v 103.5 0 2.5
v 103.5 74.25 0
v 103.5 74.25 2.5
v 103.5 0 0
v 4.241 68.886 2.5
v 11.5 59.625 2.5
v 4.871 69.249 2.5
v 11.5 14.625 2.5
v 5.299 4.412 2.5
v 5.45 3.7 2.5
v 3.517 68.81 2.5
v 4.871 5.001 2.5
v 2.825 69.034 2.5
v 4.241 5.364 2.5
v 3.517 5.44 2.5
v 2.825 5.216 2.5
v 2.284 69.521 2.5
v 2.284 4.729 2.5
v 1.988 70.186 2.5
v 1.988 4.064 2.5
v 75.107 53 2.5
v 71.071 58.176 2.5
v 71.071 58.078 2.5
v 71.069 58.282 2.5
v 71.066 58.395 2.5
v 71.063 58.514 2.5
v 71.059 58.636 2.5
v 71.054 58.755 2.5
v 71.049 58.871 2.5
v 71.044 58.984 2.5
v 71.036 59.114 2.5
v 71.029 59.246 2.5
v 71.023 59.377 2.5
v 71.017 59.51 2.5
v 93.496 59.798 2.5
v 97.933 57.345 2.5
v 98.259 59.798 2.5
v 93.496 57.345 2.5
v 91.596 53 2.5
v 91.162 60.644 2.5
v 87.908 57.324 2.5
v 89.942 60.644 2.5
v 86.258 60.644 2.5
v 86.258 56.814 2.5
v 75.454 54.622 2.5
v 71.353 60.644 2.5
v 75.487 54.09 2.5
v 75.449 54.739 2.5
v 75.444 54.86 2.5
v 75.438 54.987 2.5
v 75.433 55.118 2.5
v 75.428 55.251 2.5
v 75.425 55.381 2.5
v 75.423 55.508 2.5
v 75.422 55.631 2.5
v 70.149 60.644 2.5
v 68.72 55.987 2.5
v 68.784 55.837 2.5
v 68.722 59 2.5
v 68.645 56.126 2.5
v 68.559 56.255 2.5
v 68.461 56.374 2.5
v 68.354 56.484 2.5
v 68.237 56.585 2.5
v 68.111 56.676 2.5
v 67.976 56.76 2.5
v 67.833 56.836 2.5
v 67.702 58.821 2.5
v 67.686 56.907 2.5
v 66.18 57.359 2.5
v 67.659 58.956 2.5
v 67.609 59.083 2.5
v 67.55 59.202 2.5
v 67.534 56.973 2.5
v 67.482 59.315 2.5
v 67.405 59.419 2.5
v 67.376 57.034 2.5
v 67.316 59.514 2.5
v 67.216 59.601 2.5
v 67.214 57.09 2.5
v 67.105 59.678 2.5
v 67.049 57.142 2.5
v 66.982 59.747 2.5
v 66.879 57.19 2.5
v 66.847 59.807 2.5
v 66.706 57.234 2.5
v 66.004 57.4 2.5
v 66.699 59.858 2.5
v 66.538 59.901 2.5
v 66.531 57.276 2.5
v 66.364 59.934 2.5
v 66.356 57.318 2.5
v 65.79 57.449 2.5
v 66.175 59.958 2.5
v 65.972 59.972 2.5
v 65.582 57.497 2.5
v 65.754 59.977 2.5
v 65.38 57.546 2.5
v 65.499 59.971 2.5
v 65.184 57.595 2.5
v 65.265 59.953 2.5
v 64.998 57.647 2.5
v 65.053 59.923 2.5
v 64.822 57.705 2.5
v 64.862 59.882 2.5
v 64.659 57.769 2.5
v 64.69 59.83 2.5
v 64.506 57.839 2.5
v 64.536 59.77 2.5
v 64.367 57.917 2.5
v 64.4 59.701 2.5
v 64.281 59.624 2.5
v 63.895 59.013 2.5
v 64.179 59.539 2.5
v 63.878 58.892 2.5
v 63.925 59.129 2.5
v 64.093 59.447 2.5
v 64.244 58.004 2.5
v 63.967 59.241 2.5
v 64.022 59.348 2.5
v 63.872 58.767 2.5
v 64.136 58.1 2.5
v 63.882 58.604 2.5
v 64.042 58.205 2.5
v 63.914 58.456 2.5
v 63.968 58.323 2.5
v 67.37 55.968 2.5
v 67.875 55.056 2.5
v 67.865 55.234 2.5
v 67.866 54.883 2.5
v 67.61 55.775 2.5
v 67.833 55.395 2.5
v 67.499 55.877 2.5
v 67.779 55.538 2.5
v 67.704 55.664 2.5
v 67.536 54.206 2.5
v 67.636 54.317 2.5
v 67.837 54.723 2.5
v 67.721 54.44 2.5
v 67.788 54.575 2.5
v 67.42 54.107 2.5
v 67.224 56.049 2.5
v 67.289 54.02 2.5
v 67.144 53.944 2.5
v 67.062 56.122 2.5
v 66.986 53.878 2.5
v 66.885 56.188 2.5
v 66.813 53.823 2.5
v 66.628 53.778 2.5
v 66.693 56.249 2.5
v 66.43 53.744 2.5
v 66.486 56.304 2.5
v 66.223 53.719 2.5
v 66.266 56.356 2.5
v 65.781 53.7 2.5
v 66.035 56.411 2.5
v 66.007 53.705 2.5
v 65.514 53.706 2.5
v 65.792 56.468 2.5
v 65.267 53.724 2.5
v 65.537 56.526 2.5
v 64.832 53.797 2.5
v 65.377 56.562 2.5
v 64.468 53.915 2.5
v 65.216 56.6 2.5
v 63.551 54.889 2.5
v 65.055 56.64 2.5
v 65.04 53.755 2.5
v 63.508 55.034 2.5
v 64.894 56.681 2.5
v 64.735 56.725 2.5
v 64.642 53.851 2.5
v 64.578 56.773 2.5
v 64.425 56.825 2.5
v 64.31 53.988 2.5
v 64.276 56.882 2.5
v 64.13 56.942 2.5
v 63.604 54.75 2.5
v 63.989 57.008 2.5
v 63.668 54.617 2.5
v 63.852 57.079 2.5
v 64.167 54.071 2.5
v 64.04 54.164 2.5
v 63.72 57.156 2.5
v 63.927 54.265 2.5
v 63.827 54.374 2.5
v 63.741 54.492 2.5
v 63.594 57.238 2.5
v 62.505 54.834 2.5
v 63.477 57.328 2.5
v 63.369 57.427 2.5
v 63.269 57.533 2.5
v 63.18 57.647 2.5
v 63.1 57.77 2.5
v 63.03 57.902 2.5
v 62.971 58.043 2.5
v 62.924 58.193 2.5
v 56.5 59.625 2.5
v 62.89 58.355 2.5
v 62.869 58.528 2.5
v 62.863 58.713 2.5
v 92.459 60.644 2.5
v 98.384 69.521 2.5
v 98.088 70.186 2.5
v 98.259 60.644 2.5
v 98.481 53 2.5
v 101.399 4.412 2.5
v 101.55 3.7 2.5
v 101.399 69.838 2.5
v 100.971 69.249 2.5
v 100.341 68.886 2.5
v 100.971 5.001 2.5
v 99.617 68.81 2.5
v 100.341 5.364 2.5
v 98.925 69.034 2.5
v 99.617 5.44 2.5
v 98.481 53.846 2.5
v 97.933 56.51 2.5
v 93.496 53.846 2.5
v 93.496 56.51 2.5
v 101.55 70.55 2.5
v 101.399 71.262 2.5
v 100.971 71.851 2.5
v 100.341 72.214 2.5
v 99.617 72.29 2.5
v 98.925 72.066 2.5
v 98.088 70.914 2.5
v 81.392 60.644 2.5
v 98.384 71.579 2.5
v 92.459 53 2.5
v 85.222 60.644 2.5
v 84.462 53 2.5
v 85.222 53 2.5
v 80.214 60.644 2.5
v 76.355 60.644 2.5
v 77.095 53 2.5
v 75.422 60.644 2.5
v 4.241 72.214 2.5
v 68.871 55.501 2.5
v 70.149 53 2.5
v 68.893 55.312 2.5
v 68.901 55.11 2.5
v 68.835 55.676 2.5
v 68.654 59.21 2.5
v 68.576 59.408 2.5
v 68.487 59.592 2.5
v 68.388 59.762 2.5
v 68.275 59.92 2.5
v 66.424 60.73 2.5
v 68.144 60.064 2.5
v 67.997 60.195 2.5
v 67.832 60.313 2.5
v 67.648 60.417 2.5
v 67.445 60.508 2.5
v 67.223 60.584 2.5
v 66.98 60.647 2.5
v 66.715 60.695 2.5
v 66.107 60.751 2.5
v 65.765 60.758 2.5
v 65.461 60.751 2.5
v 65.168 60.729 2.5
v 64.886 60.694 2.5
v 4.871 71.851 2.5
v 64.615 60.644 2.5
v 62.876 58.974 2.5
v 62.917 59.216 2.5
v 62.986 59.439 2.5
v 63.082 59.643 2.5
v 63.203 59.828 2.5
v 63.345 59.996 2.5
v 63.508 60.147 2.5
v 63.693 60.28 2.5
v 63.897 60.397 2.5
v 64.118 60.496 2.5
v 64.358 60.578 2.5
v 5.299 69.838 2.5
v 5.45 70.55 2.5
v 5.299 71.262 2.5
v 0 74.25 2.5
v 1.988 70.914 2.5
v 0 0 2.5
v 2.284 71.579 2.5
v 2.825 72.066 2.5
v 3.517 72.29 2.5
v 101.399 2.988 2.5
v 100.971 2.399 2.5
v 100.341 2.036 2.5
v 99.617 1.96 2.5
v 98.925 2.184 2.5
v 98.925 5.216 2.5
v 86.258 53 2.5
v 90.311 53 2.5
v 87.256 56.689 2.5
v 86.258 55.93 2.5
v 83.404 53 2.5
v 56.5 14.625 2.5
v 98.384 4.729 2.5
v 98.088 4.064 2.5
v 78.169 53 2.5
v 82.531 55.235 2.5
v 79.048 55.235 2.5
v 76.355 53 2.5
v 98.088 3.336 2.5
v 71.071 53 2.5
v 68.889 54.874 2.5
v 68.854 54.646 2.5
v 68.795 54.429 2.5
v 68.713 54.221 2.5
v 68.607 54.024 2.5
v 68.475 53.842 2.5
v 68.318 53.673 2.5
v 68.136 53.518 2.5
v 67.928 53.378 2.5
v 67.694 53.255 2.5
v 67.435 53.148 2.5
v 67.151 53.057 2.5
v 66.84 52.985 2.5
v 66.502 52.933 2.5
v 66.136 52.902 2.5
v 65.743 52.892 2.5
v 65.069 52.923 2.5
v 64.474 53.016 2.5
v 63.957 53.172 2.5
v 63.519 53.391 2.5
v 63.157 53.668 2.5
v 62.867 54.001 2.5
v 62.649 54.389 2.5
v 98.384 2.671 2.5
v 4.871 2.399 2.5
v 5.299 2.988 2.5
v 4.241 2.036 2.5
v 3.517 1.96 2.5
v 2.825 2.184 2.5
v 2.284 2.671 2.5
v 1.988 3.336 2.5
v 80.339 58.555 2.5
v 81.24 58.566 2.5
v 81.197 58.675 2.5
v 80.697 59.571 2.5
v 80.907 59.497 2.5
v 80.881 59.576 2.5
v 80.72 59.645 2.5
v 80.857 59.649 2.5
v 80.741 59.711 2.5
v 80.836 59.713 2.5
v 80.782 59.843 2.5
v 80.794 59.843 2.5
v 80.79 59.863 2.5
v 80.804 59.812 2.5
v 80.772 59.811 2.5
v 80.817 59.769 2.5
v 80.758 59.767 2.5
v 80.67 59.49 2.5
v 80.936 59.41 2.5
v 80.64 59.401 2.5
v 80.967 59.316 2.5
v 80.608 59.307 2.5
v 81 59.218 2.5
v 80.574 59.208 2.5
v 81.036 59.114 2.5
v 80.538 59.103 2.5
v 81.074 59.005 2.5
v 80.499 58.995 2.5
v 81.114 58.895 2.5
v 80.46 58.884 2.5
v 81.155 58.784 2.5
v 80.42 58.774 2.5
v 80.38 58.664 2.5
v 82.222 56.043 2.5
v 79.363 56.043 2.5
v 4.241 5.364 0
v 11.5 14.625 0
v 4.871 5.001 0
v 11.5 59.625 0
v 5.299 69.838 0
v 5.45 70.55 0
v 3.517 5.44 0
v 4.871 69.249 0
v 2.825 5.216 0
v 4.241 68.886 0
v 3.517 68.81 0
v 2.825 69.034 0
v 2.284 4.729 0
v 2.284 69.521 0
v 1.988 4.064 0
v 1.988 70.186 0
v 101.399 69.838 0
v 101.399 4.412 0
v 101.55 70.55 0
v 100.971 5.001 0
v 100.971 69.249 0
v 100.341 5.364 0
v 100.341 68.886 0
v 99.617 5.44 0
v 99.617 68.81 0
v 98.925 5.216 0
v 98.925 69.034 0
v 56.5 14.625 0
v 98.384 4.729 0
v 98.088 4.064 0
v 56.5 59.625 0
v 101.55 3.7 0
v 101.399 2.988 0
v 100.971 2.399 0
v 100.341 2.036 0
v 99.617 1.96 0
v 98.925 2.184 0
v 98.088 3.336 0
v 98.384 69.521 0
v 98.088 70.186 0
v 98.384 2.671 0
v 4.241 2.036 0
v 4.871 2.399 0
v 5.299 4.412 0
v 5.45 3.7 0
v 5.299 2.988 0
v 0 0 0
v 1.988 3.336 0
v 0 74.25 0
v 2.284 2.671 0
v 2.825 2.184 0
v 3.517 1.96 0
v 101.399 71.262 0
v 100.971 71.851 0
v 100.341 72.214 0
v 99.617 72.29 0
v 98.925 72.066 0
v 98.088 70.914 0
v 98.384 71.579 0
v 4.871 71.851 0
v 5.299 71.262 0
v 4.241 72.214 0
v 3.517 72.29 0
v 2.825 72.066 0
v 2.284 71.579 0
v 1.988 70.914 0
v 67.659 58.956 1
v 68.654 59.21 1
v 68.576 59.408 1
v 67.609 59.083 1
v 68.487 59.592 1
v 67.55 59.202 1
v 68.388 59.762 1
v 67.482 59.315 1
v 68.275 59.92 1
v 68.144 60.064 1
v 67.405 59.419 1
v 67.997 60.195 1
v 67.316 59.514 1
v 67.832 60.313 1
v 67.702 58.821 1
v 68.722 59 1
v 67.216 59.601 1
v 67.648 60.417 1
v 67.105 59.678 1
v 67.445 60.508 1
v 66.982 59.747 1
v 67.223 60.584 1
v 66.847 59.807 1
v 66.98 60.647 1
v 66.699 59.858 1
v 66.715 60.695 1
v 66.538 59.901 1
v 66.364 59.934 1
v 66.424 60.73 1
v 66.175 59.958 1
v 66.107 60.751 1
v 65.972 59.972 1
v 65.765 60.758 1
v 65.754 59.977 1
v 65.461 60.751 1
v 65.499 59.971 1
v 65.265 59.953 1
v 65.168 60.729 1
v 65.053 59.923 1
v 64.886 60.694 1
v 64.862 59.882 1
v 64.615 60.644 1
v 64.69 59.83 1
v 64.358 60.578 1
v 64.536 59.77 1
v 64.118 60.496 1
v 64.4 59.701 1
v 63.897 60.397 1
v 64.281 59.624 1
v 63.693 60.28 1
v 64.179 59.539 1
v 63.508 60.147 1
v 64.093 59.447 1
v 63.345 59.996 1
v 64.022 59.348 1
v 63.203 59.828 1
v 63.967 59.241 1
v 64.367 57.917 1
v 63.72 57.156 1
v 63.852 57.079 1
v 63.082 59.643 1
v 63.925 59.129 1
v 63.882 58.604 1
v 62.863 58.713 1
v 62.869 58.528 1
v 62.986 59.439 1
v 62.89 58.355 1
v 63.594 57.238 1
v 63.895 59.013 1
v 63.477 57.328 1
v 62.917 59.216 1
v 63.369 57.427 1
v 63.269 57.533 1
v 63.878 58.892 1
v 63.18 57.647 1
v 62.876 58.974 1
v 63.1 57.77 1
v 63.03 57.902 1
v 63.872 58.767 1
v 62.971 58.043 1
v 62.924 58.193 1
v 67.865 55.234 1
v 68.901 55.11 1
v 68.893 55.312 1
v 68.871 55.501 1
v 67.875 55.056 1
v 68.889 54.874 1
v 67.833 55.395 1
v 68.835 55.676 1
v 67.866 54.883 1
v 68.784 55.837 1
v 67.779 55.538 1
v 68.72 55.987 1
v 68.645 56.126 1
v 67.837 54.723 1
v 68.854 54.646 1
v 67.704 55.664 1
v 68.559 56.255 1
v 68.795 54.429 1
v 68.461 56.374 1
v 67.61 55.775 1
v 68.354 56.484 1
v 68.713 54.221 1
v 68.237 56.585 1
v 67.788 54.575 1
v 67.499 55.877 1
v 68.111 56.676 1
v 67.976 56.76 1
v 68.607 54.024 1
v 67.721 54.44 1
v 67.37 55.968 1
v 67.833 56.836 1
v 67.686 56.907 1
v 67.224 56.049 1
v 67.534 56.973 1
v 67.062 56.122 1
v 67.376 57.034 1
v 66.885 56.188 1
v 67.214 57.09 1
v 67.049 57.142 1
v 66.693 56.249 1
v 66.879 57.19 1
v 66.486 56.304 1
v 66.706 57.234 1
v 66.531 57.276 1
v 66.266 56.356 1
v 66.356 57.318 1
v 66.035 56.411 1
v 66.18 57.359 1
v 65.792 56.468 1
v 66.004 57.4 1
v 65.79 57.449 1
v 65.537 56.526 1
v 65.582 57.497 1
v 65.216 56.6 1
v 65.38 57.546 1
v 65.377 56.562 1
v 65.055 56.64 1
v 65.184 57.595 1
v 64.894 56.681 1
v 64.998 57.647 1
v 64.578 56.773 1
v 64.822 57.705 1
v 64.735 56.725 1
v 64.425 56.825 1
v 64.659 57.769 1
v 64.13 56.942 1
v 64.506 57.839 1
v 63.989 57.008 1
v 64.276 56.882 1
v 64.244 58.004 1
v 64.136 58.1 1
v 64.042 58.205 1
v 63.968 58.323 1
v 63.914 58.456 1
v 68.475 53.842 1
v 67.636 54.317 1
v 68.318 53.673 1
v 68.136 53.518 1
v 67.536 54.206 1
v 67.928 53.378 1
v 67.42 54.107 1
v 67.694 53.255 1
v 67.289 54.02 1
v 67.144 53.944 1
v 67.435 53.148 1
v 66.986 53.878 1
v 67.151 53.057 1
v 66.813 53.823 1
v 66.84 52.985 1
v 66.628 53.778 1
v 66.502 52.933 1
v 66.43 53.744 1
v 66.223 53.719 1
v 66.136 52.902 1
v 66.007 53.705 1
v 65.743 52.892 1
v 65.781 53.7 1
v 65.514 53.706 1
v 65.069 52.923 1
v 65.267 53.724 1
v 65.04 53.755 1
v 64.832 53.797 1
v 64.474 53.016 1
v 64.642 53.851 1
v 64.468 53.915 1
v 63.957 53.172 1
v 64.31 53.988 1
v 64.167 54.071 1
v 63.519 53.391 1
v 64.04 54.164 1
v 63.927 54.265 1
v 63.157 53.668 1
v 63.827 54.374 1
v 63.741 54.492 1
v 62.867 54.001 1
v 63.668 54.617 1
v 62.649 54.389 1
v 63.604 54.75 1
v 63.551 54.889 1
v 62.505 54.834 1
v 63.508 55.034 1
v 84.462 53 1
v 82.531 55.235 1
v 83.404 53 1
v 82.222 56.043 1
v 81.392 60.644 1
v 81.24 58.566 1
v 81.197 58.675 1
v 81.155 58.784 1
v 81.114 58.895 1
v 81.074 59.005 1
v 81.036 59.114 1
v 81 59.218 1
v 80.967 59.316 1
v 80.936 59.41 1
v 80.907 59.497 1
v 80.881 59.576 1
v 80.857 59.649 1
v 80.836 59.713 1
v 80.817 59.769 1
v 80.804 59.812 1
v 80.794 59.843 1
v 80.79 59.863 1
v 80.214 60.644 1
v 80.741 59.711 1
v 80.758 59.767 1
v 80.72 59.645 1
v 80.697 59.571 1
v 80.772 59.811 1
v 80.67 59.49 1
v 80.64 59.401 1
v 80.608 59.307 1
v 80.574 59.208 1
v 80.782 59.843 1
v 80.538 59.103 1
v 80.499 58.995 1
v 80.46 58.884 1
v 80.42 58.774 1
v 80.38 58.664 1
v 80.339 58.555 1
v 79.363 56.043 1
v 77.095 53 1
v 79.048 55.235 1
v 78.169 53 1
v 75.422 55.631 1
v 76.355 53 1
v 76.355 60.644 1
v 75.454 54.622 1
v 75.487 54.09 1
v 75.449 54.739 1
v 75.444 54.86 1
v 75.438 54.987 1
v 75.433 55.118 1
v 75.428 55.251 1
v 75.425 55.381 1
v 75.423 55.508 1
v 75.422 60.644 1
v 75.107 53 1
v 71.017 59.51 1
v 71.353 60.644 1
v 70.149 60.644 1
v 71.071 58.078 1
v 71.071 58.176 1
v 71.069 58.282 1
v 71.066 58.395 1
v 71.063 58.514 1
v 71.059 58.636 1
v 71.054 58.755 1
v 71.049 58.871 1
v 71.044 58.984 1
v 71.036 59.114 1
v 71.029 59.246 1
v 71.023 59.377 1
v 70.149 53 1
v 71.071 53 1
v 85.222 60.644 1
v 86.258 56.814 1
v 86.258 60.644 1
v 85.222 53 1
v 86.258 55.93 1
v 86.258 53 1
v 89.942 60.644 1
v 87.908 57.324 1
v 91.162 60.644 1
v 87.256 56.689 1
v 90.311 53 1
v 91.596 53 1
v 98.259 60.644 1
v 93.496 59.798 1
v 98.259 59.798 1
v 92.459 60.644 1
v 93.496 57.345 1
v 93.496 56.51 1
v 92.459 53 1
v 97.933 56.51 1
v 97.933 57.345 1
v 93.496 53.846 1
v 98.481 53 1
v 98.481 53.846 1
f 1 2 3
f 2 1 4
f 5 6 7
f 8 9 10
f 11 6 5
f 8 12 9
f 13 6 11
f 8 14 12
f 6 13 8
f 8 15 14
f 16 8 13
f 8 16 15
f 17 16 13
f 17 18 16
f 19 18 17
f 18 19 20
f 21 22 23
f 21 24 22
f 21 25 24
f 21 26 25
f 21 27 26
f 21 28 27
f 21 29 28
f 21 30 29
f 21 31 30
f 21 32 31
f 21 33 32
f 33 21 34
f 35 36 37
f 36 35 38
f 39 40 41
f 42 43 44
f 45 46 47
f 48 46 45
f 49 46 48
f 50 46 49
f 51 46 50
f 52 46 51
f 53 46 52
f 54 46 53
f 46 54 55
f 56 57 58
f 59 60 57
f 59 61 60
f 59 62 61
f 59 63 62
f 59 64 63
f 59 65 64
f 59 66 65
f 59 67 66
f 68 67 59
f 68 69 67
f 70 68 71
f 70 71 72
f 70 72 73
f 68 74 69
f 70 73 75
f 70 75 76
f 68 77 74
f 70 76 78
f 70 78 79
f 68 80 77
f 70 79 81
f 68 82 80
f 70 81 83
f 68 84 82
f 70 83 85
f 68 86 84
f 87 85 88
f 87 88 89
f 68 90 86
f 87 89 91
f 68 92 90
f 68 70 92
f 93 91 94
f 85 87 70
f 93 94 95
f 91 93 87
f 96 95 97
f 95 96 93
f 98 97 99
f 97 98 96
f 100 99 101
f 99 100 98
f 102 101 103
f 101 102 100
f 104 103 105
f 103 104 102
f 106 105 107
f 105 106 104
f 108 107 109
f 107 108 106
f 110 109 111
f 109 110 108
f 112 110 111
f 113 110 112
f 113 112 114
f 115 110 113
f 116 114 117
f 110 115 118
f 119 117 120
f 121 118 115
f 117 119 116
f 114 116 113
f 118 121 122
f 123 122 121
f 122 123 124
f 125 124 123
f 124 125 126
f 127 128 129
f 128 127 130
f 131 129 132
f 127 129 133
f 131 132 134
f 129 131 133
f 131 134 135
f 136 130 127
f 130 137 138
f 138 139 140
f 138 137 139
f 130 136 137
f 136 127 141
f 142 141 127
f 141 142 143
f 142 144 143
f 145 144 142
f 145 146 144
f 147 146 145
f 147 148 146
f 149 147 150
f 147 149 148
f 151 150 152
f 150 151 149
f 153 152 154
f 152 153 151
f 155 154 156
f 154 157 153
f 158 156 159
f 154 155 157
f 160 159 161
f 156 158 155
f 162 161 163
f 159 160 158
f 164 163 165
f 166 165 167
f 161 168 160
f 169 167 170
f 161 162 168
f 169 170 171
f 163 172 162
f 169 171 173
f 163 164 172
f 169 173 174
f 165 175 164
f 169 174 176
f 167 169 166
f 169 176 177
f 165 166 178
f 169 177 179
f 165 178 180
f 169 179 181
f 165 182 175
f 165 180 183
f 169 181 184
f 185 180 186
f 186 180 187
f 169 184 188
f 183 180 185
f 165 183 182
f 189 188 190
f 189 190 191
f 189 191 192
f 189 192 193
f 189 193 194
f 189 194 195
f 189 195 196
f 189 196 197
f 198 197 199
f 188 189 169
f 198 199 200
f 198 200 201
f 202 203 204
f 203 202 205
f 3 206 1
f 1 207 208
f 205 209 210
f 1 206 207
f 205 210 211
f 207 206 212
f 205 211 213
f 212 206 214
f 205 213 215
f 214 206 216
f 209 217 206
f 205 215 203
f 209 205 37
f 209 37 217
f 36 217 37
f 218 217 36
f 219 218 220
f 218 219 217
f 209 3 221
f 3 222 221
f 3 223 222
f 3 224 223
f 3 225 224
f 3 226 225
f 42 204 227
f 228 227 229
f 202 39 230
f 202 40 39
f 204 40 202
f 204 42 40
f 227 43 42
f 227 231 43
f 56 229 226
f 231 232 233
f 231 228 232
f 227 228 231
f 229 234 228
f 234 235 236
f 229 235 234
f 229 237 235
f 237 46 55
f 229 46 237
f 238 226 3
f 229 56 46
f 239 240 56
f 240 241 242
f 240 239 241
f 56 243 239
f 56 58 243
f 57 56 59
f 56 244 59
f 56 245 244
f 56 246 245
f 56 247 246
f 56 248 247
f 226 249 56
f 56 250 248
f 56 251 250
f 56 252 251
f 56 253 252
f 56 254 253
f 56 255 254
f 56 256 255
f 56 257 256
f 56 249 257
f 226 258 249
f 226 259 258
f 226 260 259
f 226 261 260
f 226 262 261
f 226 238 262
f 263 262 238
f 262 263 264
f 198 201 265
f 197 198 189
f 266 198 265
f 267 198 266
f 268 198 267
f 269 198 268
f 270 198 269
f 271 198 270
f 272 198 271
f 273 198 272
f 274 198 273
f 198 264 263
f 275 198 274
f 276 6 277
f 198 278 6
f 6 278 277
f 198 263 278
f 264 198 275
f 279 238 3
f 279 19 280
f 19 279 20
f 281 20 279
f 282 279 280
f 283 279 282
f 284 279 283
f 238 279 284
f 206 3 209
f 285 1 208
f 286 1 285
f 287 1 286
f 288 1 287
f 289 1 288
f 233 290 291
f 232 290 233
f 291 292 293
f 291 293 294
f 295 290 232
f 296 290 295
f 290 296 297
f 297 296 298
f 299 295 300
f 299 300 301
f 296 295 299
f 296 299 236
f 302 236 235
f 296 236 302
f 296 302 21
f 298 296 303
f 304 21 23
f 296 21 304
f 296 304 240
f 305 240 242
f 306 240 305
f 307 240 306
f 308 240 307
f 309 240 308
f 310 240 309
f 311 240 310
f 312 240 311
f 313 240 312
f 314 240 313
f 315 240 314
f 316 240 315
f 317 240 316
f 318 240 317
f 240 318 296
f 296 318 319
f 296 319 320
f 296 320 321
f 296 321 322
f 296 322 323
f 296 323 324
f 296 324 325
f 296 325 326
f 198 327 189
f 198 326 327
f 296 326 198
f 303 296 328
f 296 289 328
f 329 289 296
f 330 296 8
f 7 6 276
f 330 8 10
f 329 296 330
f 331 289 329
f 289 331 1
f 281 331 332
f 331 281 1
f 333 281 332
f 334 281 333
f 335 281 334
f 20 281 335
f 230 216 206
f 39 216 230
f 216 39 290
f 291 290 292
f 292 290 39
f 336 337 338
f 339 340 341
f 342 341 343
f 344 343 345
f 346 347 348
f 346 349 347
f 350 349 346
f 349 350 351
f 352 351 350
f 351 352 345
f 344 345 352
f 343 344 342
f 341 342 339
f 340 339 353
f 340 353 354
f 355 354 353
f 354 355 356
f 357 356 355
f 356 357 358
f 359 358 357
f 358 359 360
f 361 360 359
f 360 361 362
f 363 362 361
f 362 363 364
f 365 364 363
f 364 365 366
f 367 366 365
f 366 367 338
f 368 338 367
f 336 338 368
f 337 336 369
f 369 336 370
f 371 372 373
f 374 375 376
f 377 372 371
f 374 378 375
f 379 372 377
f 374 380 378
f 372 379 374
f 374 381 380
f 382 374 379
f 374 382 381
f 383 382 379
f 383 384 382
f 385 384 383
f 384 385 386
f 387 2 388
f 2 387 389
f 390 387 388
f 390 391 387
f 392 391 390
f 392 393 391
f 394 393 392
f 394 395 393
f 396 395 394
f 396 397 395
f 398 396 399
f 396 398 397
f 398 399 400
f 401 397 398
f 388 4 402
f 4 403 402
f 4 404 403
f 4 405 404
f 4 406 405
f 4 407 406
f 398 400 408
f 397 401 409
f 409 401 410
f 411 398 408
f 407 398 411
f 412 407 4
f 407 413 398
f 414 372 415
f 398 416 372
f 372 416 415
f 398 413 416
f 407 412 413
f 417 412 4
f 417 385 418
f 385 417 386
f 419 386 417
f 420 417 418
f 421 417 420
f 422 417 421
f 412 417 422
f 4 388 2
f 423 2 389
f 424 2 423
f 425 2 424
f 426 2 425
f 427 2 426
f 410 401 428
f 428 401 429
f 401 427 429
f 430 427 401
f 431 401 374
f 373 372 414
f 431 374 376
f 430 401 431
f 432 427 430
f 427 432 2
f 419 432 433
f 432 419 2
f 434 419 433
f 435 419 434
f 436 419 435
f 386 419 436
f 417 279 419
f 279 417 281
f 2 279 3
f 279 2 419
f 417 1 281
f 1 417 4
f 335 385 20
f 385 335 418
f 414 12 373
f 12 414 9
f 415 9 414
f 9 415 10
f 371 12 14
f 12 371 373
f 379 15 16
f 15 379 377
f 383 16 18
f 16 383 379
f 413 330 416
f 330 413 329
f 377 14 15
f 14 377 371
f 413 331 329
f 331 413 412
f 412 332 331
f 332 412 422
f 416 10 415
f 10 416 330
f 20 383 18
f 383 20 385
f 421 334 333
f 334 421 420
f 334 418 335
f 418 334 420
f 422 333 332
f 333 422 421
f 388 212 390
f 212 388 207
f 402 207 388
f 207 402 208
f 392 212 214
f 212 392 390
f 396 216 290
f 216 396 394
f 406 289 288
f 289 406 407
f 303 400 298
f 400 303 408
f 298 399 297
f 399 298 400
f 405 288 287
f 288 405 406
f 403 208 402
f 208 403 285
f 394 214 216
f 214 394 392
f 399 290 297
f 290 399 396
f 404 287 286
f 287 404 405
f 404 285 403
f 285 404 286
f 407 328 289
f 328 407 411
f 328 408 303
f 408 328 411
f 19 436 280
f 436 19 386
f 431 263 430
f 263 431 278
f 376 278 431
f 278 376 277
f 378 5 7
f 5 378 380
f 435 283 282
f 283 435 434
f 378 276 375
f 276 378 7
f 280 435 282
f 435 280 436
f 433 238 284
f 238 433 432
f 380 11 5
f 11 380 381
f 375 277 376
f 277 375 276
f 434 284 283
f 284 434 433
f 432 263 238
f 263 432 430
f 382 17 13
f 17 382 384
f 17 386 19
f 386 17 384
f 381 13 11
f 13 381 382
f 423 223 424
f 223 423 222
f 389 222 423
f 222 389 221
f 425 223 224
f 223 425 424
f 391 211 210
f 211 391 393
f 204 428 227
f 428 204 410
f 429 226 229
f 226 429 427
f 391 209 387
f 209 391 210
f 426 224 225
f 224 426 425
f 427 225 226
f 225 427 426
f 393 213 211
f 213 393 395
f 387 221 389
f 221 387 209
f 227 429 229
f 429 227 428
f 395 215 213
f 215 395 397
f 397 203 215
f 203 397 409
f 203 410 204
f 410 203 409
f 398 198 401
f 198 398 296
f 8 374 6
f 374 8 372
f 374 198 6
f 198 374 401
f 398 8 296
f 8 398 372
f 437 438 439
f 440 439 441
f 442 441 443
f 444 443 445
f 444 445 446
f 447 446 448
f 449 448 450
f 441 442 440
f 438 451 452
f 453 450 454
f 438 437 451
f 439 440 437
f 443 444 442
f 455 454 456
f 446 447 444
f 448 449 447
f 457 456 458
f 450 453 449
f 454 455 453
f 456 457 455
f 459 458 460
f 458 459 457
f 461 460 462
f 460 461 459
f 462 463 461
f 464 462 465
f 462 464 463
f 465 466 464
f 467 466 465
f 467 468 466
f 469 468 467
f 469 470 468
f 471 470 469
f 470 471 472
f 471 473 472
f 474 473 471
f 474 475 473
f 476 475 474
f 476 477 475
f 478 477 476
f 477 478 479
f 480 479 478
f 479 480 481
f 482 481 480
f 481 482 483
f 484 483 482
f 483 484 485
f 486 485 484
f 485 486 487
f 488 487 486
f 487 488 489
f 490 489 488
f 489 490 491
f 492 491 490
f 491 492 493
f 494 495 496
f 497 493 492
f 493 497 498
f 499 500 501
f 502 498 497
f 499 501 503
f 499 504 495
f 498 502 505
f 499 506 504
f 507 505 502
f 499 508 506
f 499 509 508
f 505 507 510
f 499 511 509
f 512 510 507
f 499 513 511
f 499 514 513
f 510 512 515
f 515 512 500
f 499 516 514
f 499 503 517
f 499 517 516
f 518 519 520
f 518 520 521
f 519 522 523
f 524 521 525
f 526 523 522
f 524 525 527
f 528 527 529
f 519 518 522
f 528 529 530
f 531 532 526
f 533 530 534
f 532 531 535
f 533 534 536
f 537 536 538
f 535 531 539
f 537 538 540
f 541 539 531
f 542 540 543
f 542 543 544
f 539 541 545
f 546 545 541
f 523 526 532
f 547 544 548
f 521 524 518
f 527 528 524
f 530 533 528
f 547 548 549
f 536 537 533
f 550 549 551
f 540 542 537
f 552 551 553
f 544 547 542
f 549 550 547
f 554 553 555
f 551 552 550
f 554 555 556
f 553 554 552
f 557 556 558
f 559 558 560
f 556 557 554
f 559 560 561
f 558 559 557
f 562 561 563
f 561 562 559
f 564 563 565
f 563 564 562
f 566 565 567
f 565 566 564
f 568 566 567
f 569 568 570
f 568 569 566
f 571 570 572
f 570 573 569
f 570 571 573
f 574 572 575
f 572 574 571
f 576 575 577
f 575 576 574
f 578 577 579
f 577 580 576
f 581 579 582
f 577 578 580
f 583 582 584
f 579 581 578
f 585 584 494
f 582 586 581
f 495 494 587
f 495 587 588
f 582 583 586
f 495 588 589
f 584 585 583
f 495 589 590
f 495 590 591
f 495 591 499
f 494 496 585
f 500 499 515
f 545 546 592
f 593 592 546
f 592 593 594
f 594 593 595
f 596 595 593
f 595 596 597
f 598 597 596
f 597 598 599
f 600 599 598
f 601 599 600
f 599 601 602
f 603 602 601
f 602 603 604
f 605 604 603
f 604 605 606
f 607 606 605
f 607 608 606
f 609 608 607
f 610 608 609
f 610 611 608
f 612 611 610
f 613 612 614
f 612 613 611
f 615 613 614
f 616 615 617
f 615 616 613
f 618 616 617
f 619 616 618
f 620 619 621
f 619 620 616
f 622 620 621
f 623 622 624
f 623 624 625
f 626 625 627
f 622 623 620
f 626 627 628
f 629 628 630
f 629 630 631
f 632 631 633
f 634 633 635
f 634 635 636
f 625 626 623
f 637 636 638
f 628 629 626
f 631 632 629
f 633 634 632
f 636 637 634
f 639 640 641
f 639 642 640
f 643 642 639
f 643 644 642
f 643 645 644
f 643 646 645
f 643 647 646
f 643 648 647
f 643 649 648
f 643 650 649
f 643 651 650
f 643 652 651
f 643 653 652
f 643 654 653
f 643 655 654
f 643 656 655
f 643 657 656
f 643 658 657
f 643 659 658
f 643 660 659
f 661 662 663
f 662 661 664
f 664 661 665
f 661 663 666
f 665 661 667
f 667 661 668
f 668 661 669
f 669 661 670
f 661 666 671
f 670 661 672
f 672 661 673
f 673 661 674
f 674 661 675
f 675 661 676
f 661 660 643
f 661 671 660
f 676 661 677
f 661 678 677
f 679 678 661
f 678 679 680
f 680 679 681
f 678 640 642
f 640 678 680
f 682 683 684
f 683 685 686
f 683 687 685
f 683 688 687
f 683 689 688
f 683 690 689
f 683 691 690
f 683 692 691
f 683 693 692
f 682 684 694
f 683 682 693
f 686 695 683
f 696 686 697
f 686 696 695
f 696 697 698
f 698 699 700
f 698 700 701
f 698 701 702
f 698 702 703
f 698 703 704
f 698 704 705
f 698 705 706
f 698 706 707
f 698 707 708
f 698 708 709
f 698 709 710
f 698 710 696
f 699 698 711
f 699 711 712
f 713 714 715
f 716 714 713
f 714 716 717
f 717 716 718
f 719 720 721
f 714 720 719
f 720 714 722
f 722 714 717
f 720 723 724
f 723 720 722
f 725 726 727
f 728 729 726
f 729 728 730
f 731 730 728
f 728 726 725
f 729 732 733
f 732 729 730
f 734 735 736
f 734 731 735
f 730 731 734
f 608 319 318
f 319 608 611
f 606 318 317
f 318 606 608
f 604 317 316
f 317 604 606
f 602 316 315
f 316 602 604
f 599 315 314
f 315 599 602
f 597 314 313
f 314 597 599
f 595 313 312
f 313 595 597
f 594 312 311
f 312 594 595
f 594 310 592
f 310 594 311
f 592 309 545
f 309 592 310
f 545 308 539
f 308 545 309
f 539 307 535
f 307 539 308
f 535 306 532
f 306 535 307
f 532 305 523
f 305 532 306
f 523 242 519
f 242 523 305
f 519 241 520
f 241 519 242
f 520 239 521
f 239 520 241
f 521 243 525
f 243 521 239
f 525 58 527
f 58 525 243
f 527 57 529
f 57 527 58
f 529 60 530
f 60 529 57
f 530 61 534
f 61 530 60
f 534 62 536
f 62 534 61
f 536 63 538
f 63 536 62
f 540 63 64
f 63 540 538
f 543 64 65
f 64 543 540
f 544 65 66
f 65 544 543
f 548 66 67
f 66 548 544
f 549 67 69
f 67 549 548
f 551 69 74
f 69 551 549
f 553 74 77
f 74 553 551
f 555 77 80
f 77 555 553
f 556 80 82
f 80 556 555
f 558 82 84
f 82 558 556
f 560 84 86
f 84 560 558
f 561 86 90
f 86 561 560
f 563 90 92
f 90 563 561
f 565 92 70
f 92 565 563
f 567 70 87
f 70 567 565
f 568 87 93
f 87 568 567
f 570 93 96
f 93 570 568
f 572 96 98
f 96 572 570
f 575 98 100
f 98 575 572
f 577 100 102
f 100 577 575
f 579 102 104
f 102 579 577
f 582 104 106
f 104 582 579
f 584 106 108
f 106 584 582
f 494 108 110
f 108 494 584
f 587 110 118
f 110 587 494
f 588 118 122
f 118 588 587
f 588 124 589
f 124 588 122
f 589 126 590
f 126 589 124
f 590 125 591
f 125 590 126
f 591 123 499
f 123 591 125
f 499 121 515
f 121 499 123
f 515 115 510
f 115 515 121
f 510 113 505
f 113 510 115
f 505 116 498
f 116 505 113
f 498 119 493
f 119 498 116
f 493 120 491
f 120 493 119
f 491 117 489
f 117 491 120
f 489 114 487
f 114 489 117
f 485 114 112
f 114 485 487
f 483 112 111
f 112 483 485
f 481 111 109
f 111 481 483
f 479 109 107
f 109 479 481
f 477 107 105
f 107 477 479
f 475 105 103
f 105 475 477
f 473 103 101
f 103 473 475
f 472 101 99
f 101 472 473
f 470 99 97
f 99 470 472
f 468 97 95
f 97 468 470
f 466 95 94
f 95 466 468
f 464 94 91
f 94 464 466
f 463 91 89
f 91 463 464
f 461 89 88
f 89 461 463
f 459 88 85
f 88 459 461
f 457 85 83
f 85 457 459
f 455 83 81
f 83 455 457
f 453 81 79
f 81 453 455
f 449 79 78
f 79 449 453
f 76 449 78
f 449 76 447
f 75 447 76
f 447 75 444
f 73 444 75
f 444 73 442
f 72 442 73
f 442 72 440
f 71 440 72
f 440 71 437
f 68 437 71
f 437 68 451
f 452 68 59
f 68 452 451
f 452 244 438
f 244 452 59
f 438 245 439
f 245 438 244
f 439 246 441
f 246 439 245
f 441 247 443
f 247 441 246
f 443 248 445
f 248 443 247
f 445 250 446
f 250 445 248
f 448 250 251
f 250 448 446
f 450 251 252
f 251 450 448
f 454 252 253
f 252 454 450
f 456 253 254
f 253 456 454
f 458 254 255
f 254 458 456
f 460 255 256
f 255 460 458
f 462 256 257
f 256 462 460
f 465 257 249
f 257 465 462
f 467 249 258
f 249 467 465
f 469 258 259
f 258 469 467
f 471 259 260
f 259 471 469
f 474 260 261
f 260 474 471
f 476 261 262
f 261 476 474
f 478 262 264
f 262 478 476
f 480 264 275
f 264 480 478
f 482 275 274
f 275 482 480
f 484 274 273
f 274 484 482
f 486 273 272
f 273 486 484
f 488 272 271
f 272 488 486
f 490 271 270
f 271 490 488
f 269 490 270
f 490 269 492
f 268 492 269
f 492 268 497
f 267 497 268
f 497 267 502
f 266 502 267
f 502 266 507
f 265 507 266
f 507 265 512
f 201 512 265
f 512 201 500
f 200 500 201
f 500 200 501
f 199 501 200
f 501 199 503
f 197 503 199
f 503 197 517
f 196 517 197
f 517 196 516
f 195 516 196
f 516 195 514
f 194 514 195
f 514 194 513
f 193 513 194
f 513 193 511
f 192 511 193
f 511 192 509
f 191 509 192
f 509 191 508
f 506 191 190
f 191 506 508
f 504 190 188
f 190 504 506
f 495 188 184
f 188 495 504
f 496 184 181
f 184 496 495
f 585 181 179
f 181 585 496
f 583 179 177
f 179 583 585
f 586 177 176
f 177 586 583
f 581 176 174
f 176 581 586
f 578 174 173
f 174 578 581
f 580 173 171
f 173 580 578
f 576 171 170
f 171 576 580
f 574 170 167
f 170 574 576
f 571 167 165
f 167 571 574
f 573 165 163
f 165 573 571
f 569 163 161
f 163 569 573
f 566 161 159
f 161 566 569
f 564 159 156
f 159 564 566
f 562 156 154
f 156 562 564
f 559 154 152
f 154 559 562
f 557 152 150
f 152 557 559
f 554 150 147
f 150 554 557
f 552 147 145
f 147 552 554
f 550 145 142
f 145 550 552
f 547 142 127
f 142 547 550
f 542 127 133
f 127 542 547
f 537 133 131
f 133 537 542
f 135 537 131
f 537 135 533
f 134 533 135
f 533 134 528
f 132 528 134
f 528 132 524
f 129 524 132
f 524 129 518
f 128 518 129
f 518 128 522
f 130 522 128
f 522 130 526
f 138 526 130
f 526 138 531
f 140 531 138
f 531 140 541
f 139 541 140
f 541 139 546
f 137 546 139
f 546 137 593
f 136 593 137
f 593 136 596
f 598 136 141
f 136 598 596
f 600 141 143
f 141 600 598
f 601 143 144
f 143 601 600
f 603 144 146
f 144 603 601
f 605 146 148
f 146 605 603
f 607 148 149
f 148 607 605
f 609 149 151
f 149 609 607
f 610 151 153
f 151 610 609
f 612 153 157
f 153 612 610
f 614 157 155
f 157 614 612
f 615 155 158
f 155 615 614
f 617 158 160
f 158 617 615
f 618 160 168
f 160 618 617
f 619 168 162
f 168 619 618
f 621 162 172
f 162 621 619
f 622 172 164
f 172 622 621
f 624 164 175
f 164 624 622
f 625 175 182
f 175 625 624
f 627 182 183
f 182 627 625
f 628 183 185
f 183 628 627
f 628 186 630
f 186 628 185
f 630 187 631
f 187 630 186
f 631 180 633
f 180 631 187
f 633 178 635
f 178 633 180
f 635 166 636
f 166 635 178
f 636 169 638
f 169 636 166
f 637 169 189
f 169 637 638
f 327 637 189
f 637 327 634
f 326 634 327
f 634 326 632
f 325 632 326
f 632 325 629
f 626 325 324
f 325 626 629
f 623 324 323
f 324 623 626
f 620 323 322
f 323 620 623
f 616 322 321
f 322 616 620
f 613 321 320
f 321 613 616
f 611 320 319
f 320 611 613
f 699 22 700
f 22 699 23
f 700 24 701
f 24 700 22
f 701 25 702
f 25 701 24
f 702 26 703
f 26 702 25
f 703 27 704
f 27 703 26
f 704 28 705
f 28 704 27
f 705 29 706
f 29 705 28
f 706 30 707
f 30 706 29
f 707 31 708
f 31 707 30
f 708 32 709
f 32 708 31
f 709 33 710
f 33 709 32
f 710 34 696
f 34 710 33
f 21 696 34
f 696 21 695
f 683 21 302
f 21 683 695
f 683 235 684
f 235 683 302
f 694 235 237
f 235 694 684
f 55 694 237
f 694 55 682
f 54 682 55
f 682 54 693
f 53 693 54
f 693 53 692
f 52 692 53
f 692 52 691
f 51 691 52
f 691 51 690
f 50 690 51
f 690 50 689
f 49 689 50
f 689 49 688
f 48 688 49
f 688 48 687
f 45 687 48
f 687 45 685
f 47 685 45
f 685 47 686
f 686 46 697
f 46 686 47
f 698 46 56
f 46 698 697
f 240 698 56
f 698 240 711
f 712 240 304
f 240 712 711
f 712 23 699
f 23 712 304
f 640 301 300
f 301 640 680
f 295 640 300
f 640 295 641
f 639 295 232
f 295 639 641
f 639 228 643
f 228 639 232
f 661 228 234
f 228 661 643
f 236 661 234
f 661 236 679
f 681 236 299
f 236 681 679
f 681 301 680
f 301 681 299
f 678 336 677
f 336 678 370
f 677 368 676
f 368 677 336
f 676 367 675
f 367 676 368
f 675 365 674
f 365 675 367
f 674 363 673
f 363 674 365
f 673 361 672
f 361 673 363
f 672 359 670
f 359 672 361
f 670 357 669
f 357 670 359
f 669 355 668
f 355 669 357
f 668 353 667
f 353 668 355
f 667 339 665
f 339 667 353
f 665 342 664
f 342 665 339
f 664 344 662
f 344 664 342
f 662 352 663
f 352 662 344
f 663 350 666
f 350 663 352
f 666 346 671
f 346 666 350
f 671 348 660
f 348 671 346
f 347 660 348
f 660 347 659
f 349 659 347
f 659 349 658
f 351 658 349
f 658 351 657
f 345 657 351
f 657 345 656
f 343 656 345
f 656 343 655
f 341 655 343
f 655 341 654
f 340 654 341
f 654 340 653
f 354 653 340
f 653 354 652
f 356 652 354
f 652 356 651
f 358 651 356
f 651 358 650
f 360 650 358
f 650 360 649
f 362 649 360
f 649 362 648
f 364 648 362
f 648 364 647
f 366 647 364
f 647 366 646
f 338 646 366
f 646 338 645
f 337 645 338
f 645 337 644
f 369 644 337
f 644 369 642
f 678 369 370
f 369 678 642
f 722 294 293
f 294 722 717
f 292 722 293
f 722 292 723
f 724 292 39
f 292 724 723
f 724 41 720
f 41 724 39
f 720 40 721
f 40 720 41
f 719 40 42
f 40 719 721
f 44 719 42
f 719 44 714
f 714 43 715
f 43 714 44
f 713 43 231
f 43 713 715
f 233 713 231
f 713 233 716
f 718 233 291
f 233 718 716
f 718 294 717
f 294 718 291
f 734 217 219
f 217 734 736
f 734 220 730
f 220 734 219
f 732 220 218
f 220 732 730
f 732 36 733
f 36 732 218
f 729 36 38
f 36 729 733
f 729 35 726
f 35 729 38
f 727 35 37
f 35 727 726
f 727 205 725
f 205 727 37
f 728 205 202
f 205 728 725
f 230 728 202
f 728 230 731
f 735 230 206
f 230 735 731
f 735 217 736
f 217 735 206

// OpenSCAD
length = 103.5;
width = 74.25;
thickness = 2.5;
screw_hole_width = 66.85;
screw_hole_length = 96.96;
diameter_screw_hole = 3.5;
viewport_size = 45;

screw_hole_border_width = (width - screw_hole_width) / 2;

module viewport()
{
    distance_from_edge = 11.5;
    
    translate([distance_from_edge, (width - viewport_size) / 2, 0])
        cube([viewport_size, viewport_size, thickness]);
}
module top()
{
    cube([length, width, thickness]);
}
module screw_hole(x, y, z)
{
    $fn = 15;
    translate([x, y, z])
        #cylinder(thickness, d = diameter_screw_hole);
}

module snake_text()
{
    translate([62, 53, 1])
        linear_extrude(1.5)
            text("SNAKE", size = 8);
}

difference()
{
    top();
    screw_hole(screw_hole_border_width, screw_hole_border_width, 0);
    #screw_hole(length - screw_hole_border_width, screw_hole_border_width, 0);
    screw_hole(screw_hole_border_width, width -screw_hole_border_width, 0);
    screw_hole(length - screw_hole_border_width, width -screw_hole_border_width, 0);
    viewport();
    #snake_text();
}
